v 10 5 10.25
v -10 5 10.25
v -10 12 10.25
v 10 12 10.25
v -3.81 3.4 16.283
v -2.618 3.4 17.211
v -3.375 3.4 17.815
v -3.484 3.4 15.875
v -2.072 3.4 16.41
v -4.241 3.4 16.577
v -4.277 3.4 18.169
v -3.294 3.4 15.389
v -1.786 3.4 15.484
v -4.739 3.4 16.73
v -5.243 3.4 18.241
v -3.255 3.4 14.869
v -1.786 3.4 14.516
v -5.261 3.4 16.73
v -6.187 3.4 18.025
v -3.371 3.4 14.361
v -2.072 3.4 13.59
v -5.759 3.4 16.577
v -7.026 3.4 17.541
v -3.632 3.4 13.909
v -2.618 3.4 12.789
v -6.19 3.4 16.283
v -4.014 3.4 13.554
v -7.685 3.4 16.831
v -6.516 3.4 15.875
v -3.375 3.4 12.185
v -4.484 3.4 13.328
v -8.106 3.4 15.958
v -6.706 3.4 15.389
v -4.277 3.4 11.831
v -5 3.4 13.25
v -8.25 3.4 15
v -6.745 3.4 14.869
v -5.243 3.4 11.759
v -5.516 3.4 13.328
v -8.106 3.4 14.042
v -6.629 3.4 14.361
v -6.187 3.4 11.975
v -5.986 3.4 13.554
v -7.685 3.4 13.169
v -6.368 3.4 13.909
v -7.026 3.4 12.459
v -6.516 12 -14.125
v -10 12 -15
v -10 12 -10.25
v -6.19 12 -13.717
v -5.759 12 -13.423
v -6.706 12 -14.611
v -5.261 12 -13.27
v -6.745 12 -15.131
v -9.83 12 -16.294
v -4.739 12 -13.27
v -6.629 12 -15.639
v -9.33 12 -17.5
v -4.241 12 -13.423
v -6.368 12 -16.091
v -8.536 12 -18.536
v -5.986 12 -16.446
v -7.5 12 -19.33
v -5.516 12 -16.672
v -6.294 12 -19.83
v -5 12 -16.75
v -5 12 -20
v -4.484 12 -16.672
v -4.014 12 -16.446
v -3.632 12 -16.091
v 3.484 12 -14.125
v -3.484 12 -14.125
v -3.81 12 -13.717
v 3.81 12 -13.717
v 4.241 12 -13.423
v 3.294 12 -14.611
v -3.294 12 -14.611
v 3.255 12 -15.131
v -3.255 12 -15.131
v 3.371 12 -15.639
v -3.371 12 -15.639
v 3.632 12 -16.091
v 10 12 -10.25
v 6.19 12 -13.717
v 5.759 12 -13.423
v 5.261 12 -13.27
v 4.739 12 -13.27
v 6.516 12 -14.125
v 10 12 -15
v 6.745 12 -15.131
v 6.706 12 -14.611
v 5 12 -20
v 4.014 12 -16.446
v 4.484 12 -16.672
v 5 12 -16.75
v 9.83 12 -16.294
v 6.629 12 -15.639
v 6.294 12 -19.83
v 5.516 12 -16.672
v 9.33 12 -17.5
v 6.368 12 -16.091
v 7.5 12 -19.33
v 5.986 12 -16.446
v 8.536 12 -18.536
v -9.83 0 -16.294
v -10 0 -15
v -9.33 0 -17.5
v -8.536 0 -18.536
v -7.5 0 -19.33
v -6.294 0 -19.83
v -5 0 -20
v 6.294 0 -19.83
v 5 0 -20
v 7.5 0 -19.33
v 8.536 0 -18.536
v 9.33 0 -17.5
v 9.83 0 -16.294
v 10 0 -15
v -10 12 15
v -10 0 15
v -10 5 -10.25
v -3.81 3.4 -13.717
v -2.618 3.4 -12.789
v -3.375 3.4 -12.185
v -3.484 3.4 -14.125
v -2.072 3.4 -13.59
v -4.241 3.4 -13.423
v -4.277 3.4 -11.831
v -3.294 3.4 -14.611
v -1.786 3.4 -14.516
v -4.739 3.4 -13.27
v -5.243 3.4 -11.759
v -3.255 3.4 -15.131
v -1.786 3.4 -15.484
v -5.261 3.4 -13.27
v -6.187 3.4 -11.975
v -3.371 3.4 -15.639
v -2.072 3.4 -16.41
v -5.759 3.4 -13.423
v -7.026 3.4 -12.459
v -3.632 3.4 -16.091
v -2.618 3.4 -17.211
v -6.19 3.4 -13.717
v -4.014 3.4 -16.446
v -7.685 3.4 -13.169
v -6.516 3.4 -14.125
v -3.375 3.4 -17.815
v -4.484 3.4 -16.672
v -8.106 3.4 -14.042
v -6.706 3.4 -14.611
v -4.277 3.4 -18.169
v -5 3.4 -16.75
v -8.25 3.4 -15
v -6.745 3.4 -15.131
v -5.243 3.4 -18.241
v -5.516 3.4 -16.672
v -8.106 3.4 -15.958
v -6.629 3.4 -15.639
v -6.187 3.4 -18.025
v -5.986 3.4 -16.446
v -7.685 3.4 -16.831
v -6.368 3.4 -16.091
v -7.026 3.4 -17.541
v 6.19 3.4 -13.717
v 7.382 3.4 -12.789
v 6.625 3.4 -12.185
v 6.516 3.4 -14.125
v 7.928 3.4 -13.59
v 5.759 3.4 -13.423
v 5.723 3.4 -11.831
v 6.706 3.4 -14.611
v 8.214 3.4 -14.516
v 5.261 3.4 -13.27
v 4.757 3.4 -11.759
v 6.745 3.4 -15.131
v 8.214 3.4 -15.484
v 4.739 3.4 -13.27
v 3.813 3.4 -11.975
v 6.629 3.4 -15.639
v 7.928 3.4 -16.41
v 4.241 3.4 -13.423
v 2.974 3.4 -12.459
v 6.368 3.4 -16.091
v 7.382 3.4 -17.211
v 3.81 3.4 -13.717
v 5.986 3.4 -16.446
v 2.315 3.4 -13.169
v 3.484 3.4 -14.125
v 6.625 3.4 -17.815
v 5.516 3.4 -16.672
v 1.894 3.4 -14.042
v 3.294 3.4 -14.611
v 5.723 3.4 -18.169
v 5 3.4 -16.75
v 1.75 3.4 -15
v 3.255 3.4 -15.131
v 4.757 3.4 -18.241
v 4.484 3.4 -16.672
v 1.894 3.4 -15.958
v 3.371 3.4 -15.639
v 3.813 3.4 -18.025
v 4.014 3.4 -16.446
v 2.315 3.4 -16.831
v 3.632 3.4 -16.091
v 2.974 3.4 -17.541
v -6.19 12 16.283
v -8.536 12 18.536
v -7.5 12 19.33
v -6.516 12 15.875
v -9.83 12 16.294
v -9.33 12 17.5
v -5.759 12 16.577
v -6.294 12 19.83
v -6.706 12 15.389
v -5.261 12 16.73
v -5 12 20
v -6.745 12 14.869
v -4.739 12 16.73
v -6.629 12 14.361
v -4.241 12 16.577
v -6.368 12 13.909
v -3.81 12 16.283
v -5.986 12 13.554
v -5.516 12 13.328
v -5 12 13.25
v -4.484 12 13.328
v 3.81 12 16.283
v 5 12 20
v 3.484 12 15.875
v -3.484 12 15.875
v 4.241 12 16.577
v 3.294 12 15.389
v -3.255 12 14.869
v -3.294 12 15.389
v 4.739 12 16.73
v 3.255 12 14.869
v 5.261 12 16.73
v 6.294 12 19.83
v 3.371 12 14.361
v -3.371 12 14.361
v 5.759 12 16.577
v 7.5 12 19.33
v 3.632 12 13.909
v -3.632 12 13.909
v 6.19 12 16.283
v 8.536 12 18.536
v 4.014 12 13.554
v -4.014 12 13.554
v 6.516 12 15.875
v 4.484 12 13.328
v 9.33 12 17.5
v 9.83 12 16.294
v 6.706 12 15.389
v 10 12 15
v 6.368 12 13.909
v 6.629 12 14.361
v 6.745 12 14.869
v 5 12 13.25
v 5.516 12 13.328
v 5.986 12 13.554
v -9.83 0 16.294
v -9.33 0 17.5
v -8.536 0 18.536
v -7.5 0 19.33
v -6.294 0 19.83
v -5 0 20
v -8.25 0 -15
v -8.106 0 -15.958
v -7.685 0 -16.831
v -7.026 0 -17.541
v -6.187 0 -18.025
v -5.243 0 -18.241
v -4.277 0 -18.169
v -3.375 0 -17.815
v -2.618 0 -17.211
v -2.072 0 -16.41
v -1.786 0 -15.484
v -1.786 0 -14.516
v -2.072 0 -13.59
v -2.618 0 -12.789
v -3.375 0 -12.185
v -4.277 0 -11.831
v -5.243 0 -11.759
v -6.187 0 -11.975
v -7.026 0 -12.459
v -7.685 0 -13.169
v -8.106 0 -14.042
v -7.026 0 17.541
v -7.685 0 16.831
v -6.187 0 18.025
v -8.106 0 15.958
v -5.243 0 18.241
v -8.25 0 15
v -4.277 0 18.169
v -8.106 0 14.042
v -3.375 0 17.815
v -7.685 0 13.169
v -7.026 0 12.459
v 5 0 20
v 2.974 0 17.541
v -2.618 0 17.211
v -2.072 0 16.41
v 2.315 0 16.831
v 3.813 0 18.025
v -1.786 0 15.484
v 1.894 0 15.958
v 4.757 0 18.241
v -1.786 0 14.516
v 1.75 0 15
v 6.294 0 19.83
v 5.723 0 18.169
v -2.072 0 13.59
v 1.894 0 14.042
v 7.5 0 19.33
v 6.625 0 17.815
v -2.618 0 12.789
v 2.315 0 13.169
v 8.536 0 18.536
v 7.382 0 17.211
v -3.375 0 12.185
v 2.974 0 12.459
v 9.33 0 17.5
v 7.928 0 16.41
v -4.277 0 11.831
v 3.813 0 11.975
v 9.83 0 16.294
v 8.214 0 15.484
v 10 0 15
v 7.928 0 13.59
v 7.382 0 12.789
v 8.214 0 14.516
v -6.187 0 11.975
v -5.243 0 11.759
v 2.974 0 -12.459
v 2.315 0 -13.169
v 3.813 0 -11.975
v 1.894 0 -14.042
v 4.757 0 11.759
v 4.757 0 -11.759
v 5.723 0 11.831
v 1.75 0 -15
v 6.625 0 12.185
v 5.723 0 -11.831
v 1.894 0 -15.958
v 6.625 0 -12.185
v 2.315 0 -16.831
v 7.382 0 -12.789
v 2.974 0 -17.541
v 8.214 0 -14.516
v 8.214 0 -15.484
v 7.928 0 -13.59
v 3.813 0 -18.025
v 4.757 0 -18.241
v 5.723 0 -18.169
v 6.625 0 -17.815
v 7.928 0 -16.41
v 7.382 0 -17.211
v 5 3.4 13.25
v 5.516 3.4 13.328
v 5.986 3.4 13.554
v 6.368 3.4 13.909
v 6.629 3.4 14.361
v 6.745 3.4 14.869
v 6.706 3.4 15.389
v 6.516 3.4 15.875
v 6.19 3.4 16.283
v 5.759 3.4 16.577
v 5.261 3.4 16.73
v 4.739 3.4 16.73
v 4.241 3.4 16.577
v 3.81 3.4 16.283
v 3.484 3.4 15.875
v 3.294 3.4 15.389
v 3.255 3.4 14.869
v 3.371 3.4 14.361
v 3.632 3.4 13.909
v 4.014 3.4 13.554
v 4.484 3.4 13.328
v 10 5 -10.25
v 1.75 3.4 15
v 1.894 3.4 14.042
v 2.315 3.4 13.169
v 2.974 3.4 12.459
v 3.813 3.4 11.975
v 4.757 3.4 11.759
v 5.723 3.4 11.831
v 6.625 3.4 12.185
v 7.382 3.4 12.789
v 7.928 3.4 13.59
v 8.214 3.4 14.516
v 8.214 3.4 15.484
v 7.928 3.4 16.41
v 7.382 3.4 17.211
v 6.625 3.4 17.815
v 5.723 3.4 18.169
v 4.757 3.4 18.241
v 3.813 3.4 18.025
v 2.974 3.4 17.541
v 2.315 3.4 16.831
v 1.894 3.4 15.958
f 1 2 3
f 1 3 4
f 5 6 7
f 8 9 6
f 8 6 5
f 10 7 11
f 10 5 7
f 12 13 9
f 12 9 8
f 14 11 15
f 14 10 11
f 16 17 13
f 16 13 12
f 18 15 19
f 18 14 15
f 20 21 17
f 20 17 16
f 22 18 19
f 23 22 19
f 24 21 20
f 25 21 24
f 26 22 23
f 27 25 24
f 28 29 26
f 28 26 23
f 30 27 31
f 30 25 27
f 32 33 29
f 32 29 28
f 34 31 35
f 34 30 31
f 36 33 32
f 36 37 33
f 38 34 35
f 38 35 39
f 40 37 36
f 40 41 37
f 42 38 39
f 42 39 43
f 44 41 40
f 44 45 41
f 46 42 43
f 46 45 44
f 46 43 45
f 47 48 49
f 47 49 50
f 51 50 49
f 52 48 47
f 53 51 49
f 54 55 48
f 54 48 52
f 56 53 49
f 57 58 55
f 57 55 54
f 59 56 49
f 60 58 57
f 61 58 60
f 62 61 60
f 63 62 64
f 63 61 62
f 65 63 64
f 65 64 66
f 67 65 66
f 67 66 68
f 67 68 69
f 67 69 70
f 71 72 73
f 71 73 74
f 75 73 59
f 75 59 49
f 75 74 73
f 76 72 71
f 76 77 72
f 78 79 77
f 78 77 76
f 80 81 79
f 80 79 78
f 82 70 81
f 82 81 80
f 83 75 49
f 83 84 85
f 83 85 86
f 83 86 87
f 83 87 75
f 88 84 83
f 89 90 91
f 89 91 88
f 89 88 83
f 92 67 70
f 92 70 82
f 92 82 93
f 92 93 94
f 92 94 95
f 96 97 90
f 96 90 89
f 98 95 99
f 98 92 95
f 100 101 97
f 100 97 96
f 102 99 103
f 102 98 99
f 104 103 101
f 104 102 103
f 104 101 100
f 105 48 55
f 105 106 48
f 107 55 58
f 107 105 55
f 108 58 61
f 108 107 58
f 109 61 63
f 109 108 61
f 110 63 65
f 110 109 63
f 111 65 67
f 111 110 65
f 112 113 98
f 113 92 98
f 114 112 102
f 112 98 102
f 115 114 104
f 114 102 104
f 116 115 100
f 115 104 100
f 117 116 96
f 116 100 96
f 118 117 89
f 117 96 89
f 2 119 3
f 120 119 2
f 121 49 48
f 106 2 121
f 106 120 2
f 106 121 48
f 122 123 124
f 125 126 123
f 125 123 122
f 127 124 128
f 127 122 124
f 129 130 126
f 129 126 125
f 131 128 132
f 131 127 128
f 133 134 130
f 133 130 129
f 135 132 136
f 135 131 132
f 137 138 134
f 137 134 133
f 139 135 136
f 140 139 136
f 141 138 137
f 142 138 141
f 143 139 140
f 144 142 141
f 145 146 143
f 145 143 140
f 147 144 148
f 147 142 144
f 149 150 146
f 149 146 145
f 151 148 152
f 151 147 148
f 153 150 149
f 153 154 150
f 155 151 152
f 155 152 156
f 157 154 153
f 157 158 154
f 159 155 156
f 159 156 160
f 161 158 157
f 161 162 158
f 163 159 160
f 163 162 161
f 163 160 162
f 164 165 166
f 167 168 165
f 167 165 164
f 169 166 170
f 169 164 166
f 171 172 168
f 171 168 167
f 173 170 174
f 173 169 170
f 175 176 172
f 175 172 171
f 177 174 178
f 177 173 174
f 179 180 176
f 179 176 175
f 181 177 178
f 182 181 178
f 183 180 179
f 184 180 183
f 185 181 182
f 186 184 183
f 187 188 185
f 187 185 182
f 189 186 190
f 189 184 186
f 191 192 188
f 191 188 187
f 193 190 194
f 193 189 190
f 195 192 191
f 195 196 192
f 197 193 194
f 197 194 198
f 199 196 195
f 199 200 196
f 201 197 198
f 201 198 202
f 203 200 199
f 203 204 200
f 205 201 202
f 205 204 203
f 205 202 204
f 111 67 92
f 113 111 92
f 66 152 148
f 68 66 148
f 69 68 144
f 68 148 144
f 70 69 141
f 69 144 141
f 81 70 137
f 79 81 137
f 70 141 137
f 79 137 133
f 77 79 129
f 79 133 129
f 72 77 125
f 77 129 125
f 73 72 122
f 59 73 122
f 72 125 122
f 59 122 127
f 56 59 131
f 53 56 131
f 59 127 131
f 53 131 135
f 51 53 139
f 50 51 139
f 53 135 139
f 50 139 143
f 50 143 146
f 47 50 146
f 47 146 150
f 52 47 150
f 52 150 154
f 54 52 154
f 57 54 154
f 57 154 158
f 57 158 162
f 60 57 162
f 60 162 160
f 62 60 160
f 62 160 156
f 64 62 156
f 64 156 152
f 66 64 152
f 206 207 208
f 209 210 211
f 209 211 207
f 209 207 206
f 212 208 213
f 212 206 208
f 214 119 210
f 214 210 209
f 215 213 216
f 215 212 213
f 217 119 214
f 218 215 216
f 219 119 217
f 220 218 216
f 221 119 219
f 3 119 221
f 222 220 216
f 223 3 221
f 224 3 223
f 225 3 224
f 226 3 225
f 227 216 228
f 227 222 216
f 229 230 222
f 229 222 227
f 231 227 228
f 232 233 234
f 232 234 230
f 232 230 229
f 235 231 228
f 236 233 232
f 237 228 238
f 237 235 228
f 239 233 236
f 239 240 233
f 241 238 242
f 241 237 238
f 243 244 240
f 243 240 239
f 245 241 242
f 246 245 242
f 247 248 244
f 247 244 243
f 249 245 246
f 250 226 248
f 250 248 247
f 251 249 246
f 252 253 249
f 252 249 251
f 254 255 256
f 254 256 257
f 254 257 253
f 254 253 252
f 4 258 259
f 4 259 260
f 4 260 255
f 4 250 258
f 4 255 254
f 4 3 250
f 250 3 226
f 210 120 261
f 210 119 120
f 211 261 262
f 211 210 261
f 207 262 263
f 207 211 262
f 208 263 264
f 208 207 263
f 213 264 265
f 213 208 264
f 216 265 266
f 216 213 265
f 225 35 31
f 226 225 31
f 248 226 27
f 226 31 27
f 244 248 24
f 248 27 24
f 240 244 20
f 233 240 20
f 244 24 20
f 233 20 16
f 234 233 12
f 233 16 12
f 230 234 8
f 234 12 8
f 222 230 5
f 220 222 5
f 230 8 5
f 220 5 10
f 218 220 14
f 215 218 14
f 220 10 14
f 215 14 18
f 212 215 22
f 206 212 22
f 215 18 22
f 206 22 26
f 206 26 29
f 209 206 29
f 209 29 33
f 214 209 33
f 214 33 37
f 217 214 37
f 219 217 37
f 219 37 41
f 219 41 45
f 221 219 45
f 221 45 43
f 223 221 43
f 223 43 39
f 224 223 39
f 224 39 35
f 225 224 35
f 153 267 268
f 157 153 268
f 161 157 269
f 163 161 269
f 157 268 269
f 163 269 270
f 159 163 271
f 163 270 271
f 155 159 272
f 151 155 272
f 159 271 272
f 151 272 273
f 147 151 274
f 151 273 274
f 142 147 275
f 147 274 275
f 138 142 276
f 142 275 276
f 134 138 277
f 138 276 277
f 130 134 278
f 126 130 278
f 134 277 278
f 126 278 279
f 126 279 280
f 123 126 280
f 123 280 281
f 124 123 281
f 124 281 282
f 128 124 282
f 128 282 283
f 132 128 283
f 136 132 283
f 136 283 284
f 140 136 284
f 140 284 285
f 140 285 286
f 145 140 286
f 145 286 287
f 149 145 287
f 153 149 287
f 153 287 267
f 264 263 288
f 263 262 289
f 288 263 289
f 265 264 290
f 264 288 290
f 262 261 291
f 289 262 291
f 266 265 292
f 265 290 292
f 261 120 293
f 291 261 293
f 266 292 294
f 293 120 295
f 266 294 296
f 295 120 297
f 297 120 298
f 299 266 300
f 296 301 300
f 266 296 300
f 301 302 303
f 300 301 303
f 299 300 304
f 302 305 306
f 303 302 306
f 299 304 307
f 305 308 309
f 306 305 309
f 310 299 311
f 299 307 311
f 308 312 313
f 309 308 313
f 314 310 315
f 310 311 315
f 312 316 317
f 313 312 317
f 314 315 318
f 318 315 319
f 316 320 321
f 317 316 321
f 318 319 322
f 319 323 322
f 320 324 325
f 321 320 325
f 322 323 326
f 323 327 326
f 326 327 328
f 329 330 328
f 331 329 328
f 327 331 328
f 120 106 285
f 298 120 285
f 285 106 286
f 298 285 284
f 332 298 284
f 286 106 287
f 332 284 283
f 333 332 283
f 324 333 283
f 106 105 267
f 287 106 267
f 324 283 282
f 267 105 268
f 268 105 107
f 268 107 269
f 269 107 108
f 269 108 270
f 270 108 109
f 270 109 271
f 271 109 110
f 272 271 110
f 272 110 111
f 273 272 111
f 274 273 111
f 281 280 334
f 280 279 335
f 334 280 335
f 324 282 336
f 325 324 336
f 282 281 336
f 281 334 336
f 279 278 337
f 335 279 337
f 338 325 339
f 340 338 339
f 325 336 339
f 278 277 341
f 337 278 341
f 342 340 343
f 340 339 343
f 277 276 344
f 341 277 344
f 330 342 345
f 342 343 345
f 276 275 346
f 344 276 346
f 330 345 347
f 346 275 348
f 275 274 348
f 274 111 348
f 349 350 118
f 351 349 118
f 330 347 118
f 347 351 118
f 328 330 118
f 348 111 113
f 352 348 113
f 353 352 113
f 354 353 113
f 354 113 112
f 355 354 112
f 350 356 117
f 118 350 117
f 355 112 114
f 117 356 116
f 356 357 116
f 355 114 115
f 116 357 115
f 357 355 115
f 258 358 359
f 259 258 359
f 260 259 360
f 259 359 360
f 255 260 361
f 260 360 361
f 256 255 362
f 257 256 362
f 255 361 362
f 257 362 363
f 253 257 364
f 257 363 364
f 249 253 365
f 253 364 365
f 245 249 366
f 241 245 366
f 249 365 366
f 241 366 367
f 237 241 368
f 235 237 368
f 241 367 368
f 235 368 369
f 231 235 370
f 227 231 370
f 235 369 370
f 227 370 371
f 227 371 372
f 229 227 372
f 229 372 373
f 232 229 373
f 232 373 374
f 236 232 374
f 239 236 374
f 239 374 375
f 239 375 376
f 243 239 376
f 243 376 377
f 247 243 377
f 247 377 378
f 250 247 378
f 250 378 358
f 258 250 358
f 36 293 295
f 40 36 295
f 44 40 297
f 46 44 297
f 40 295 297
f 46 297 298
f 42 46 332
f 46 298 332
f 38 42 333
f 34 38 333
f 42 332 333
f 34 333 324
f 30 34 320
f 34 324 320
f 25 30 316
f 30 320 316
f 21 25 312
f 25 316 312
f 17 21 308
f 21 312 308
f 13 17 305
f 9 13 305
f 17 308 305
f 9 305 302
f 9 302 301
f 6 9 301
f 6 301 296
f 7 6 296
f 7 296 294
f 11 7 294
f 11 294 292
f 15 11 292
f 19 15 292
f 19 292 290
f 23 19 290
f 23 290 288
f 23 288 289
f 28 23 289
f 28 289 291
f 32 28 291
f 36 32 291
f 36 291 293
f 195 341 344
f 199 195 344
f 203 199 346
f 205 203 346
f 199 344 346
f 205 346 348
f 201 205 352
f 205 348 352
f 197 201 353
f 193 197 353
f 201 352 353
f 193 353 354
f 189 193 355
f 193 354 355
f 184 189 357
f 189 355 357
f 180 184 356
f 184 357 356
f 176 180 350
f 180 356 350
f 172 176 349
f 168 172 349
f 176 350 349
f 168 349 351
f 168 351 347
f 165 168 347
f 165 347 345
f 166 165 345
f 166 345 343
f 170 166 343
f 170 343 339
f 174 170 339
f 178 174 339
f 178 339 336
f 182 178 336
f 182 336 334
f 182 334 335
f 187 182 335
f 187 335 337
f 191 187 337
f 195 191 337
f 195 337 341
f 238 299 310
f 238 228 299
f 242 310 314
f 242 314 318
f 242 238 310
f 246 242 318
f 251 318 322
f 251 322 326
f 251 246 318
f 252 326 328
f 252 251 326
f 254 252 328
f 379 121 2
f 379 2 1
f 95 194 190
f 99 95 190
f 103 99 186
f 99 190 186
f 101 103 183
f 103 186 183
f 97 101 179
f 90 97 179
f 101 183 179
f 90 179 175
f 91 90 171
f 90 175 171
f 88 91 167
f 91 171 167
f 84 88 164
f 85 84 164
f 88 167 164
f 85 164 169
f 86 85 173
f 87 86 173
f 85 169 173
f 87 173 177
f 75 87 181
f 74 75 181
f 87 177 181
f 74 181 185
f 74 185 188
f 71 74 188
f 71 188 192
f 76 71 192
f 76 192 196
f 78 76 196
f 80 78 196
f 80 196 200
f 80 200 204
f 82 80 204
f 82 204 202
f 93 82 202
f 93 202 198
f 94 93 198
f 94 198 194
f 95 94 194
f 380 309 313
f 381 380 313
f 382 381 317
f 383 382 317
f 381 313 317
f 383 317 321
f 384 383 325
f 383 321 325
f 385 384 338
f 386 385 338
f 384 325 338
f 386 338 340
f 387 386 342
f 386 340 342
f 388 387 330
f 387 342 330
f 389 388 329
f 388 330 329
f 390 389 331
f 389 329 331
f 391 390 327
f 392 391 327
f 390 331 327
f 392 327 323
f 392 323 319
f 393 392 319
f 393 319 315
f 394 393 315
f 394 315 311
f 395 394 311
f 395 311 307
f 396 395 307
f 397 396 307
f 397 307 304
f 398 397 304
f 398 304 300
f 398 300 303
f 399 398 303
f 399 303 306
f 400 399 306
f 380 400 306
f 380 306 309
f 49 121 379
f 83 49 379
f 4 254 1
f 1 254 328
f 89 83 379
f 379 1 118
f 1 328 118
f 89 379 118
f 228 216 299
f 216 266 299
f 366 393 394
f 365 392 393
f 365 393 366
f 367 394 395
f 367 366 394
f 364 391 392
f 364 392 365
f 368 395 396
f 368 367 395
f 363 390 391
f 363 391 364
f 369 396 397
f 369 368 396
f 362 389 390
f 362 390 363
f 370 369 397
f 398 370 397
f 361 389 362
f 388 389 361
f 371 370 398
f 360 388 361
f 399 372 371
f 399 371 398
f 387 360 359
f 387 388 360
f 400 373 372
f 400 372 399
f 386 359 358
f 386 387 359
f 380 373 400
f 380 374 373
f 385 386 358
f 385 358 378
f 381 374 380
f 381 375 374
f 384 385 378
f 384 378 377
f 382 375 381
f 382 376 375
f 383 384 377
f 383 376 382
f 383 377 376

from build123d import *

# Parameters (mm, degrees)
SKETCH1_W                                           = 20
SKETCH1_H                                           = 40
BOSS_EXTRUDE1_DEPTH                                 = 5
SKETCH2_W                                           = 20
SKETCH2_H                                           = 9.75
BOSS_EXTRUDE2_DEPTH                                 = 7
SKETCH3_R                                           = 1.75
CUT_EXTRUDE1_DEPTH                                  = 26.377155081
CBORE_FOR_M3_HEX_SOCKET_HEAD_CAP_SCREW1_D           = 3.4
CBORE_FOR_M3_HEX_SOCKET_HEAD_CAP_SCREW1_CBORE_D     = 6.5
CBORE_FOR_M3_HEX_SOCKET_HEAD_CAP_SCREW1_CBORE_DEPTH = 3.4
FILLET1_R                                           = 5


with BuildPart() as part:
    # Sketch1 → Boss-Extrude1 (new body)
    with BuildSketch(Plane(origin=(0, 0, 0), x_dir=(1, 0, 0), z_dir=(0, 1, 0))):
        Rectangle(SKETCH1_W, SKETCH1_H)
    extrude(amount=BOSS_EXTRUDE1_DEPTH)

    # Sketch2 → Boss-Extrude2 (add)
    with BuildSketch(Plane(origin=(0, 5, 0), x_dir=(1, 0, 0), z_dir=(0, 1, 0))):
        with Locations((0, -15.125)):
            Rectangle(SKETCH2_W, SKETCH2_H)
        with Locations((0, 15.125)):
            Rectangle(SKETCH2_W, SKETCH2_H)
    extrude(amount=BOSS_EXTRUDE2_DEPTH)

    # Sketch3 → Cut-Extrude1 (cut, through all)
    with BuildSketch(Plane.XZ):
        with Locations(Location((5, 15, 0), (0, 0, 270))):
            Circle(SKETCH3_R)
        with Locations(Location((-5, 15, 0), (0, 0, 270))):
            Circle(SKETCH3_R)
        with Locations(Location((-5, -15, 0), (0, 0, 270))):
            Circle(SKETCH3_R)
        with Locations(Location((5, -15, 0), (0, 0, 270))):
            Circle(SKETCH3_R)
    extrude(amount=-CUT_EXTRUDE1_DEPTH, mode=Mode.SUBTRACT)

    # CBORE for M3 Hex Socket Head Cap Screw1 (through all)
    with Locations(Plane(origin=(0, 0, 0), x_dir=(-1, 0, 0), z_dir=(0, -1, 0))):
        with Locations((-5, -15), (5, -15), (5, 15), (-5, 15)):
            CounterBoreHole(CBORE_FOR_M3_HEX_SOCKET_HEAD_CAP_SCREW1_D / 2, CBORE_FOR_M3_HEX_SOCKET_HEAD_CAP_SCREW1_CBORE_D / 2, CBORE_FOR_M3_HEX_SOCKET_HEAD_CAP_SCREW1_CBORE_DEPTH)

    # Fillet1
    fillet1_edges = [part.edges().sort_by_distance(p)[0] for p in [
        (10, 6, 20),
        (-10, 6, 20),
        (-10, 6, -20),
        (10, 6, -20),
    ]]
    fillet(fillet1_edges, radius=FILLET1_R)


solid = part.part
